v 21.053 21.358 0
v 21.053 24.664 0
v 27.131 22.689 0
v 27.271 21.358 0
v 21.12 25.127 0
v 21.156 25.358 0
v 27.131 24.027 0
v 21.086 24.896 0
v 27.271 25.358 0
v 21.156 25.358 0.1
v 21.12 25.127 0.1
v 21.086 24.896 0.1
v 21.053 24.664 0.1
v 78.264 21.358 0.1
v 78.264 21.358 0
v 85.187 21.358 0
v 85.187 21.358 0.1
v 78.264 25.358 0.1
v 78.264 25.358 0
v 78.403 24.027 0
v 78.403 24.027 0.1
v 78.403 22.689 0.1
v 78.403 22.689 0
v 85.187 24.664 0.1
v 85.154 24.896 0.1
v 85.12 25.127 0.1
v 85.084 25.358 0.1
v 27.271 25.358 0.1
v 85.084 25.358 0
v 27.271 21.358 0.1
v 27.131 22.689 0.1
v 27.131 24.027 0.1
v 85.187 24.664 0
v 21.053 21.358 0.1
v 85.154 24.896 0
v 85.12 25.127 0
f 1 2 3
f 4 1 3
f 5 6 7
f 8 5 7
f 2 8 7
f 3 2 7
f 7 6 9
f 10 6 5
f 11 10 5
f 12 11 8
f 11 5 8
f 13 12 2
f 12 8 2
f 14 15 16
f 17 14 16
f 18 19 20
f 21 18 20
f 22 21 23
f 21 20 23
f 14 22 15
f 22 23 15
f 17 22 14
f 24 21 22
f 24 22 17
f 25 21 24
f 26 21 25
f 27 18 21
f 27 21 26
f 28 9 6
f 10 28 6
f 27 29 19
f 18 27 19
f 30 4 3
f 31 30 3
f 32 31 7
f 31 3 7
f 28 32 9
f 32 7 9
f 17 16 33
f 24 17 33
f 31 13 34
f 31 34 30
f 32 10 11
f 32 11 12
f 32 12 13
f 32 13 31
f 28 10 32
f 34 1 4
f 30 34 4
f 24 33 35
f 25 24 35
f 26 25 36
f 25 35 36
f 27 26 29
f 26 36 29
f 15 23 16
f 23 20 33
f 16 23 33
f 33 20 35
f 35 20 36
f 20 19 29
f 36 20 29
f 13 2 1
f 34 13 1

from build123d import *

# Parameters (mm, degrees)
SALIENTE_EXTRUIR1_DEPTH   = 0.1
SALIENTE_EXTRUIR1_2_DEPTH = 0.1


with BuildPart() as part:
    # Model → Saliente-Extruir1 (new body)
    with BuildSketch(Plane.XY):
        with BuildLine():
            Line((85.186650916, 21.357722957), (85.186650916, 24.664118021))
            ThreePointArc((85.186650916, 24.664118021), (85.137193195, 25.011198527), (85.083978887, 25.357722957))
            Line((85.083978887, 25.357722957), (78.263745687, 25.357722957))
            ThreePointArc((78.263745687, 25.357722957), (78.420630281, 23.357722957), (78.263745687, 21.357722957))
            Line((78.263745687, 21.357722957), (85.186650916, 21.357722957))
        make_face()
    extrude(amount=SALIENTE_EXTRUIR1_DEPTH)


with BuildPart() as body_2:
    # Model → Saliente-Extruir1 2 (new body)
    with BuildSketch(Plane.XY):
        with BuildLine():
            Line((27.270848208, 25.357722957), (21.155989611, 25.357722957))
            ThreePointArc((21.155989611, 25.357722957), (21.102775302, 25.011198527), (21.053317582, 24.664118021))
            Line((21.053317582, 24.664118021), (21.053317582, 21.357722957))
            Line((21.053317582, 21.357722957), (27.270848208, 21.357722957))
            ThreePointArc((27.270848208, 21.357722957), (27.113963614, 23.357722957), (27.270848208, 25.357722957))
        make_face()
    extrude(amount=SALIENTE_EXTRUIR1_2_DEPTH)


solid = Compound([part.part, body_2.part])
